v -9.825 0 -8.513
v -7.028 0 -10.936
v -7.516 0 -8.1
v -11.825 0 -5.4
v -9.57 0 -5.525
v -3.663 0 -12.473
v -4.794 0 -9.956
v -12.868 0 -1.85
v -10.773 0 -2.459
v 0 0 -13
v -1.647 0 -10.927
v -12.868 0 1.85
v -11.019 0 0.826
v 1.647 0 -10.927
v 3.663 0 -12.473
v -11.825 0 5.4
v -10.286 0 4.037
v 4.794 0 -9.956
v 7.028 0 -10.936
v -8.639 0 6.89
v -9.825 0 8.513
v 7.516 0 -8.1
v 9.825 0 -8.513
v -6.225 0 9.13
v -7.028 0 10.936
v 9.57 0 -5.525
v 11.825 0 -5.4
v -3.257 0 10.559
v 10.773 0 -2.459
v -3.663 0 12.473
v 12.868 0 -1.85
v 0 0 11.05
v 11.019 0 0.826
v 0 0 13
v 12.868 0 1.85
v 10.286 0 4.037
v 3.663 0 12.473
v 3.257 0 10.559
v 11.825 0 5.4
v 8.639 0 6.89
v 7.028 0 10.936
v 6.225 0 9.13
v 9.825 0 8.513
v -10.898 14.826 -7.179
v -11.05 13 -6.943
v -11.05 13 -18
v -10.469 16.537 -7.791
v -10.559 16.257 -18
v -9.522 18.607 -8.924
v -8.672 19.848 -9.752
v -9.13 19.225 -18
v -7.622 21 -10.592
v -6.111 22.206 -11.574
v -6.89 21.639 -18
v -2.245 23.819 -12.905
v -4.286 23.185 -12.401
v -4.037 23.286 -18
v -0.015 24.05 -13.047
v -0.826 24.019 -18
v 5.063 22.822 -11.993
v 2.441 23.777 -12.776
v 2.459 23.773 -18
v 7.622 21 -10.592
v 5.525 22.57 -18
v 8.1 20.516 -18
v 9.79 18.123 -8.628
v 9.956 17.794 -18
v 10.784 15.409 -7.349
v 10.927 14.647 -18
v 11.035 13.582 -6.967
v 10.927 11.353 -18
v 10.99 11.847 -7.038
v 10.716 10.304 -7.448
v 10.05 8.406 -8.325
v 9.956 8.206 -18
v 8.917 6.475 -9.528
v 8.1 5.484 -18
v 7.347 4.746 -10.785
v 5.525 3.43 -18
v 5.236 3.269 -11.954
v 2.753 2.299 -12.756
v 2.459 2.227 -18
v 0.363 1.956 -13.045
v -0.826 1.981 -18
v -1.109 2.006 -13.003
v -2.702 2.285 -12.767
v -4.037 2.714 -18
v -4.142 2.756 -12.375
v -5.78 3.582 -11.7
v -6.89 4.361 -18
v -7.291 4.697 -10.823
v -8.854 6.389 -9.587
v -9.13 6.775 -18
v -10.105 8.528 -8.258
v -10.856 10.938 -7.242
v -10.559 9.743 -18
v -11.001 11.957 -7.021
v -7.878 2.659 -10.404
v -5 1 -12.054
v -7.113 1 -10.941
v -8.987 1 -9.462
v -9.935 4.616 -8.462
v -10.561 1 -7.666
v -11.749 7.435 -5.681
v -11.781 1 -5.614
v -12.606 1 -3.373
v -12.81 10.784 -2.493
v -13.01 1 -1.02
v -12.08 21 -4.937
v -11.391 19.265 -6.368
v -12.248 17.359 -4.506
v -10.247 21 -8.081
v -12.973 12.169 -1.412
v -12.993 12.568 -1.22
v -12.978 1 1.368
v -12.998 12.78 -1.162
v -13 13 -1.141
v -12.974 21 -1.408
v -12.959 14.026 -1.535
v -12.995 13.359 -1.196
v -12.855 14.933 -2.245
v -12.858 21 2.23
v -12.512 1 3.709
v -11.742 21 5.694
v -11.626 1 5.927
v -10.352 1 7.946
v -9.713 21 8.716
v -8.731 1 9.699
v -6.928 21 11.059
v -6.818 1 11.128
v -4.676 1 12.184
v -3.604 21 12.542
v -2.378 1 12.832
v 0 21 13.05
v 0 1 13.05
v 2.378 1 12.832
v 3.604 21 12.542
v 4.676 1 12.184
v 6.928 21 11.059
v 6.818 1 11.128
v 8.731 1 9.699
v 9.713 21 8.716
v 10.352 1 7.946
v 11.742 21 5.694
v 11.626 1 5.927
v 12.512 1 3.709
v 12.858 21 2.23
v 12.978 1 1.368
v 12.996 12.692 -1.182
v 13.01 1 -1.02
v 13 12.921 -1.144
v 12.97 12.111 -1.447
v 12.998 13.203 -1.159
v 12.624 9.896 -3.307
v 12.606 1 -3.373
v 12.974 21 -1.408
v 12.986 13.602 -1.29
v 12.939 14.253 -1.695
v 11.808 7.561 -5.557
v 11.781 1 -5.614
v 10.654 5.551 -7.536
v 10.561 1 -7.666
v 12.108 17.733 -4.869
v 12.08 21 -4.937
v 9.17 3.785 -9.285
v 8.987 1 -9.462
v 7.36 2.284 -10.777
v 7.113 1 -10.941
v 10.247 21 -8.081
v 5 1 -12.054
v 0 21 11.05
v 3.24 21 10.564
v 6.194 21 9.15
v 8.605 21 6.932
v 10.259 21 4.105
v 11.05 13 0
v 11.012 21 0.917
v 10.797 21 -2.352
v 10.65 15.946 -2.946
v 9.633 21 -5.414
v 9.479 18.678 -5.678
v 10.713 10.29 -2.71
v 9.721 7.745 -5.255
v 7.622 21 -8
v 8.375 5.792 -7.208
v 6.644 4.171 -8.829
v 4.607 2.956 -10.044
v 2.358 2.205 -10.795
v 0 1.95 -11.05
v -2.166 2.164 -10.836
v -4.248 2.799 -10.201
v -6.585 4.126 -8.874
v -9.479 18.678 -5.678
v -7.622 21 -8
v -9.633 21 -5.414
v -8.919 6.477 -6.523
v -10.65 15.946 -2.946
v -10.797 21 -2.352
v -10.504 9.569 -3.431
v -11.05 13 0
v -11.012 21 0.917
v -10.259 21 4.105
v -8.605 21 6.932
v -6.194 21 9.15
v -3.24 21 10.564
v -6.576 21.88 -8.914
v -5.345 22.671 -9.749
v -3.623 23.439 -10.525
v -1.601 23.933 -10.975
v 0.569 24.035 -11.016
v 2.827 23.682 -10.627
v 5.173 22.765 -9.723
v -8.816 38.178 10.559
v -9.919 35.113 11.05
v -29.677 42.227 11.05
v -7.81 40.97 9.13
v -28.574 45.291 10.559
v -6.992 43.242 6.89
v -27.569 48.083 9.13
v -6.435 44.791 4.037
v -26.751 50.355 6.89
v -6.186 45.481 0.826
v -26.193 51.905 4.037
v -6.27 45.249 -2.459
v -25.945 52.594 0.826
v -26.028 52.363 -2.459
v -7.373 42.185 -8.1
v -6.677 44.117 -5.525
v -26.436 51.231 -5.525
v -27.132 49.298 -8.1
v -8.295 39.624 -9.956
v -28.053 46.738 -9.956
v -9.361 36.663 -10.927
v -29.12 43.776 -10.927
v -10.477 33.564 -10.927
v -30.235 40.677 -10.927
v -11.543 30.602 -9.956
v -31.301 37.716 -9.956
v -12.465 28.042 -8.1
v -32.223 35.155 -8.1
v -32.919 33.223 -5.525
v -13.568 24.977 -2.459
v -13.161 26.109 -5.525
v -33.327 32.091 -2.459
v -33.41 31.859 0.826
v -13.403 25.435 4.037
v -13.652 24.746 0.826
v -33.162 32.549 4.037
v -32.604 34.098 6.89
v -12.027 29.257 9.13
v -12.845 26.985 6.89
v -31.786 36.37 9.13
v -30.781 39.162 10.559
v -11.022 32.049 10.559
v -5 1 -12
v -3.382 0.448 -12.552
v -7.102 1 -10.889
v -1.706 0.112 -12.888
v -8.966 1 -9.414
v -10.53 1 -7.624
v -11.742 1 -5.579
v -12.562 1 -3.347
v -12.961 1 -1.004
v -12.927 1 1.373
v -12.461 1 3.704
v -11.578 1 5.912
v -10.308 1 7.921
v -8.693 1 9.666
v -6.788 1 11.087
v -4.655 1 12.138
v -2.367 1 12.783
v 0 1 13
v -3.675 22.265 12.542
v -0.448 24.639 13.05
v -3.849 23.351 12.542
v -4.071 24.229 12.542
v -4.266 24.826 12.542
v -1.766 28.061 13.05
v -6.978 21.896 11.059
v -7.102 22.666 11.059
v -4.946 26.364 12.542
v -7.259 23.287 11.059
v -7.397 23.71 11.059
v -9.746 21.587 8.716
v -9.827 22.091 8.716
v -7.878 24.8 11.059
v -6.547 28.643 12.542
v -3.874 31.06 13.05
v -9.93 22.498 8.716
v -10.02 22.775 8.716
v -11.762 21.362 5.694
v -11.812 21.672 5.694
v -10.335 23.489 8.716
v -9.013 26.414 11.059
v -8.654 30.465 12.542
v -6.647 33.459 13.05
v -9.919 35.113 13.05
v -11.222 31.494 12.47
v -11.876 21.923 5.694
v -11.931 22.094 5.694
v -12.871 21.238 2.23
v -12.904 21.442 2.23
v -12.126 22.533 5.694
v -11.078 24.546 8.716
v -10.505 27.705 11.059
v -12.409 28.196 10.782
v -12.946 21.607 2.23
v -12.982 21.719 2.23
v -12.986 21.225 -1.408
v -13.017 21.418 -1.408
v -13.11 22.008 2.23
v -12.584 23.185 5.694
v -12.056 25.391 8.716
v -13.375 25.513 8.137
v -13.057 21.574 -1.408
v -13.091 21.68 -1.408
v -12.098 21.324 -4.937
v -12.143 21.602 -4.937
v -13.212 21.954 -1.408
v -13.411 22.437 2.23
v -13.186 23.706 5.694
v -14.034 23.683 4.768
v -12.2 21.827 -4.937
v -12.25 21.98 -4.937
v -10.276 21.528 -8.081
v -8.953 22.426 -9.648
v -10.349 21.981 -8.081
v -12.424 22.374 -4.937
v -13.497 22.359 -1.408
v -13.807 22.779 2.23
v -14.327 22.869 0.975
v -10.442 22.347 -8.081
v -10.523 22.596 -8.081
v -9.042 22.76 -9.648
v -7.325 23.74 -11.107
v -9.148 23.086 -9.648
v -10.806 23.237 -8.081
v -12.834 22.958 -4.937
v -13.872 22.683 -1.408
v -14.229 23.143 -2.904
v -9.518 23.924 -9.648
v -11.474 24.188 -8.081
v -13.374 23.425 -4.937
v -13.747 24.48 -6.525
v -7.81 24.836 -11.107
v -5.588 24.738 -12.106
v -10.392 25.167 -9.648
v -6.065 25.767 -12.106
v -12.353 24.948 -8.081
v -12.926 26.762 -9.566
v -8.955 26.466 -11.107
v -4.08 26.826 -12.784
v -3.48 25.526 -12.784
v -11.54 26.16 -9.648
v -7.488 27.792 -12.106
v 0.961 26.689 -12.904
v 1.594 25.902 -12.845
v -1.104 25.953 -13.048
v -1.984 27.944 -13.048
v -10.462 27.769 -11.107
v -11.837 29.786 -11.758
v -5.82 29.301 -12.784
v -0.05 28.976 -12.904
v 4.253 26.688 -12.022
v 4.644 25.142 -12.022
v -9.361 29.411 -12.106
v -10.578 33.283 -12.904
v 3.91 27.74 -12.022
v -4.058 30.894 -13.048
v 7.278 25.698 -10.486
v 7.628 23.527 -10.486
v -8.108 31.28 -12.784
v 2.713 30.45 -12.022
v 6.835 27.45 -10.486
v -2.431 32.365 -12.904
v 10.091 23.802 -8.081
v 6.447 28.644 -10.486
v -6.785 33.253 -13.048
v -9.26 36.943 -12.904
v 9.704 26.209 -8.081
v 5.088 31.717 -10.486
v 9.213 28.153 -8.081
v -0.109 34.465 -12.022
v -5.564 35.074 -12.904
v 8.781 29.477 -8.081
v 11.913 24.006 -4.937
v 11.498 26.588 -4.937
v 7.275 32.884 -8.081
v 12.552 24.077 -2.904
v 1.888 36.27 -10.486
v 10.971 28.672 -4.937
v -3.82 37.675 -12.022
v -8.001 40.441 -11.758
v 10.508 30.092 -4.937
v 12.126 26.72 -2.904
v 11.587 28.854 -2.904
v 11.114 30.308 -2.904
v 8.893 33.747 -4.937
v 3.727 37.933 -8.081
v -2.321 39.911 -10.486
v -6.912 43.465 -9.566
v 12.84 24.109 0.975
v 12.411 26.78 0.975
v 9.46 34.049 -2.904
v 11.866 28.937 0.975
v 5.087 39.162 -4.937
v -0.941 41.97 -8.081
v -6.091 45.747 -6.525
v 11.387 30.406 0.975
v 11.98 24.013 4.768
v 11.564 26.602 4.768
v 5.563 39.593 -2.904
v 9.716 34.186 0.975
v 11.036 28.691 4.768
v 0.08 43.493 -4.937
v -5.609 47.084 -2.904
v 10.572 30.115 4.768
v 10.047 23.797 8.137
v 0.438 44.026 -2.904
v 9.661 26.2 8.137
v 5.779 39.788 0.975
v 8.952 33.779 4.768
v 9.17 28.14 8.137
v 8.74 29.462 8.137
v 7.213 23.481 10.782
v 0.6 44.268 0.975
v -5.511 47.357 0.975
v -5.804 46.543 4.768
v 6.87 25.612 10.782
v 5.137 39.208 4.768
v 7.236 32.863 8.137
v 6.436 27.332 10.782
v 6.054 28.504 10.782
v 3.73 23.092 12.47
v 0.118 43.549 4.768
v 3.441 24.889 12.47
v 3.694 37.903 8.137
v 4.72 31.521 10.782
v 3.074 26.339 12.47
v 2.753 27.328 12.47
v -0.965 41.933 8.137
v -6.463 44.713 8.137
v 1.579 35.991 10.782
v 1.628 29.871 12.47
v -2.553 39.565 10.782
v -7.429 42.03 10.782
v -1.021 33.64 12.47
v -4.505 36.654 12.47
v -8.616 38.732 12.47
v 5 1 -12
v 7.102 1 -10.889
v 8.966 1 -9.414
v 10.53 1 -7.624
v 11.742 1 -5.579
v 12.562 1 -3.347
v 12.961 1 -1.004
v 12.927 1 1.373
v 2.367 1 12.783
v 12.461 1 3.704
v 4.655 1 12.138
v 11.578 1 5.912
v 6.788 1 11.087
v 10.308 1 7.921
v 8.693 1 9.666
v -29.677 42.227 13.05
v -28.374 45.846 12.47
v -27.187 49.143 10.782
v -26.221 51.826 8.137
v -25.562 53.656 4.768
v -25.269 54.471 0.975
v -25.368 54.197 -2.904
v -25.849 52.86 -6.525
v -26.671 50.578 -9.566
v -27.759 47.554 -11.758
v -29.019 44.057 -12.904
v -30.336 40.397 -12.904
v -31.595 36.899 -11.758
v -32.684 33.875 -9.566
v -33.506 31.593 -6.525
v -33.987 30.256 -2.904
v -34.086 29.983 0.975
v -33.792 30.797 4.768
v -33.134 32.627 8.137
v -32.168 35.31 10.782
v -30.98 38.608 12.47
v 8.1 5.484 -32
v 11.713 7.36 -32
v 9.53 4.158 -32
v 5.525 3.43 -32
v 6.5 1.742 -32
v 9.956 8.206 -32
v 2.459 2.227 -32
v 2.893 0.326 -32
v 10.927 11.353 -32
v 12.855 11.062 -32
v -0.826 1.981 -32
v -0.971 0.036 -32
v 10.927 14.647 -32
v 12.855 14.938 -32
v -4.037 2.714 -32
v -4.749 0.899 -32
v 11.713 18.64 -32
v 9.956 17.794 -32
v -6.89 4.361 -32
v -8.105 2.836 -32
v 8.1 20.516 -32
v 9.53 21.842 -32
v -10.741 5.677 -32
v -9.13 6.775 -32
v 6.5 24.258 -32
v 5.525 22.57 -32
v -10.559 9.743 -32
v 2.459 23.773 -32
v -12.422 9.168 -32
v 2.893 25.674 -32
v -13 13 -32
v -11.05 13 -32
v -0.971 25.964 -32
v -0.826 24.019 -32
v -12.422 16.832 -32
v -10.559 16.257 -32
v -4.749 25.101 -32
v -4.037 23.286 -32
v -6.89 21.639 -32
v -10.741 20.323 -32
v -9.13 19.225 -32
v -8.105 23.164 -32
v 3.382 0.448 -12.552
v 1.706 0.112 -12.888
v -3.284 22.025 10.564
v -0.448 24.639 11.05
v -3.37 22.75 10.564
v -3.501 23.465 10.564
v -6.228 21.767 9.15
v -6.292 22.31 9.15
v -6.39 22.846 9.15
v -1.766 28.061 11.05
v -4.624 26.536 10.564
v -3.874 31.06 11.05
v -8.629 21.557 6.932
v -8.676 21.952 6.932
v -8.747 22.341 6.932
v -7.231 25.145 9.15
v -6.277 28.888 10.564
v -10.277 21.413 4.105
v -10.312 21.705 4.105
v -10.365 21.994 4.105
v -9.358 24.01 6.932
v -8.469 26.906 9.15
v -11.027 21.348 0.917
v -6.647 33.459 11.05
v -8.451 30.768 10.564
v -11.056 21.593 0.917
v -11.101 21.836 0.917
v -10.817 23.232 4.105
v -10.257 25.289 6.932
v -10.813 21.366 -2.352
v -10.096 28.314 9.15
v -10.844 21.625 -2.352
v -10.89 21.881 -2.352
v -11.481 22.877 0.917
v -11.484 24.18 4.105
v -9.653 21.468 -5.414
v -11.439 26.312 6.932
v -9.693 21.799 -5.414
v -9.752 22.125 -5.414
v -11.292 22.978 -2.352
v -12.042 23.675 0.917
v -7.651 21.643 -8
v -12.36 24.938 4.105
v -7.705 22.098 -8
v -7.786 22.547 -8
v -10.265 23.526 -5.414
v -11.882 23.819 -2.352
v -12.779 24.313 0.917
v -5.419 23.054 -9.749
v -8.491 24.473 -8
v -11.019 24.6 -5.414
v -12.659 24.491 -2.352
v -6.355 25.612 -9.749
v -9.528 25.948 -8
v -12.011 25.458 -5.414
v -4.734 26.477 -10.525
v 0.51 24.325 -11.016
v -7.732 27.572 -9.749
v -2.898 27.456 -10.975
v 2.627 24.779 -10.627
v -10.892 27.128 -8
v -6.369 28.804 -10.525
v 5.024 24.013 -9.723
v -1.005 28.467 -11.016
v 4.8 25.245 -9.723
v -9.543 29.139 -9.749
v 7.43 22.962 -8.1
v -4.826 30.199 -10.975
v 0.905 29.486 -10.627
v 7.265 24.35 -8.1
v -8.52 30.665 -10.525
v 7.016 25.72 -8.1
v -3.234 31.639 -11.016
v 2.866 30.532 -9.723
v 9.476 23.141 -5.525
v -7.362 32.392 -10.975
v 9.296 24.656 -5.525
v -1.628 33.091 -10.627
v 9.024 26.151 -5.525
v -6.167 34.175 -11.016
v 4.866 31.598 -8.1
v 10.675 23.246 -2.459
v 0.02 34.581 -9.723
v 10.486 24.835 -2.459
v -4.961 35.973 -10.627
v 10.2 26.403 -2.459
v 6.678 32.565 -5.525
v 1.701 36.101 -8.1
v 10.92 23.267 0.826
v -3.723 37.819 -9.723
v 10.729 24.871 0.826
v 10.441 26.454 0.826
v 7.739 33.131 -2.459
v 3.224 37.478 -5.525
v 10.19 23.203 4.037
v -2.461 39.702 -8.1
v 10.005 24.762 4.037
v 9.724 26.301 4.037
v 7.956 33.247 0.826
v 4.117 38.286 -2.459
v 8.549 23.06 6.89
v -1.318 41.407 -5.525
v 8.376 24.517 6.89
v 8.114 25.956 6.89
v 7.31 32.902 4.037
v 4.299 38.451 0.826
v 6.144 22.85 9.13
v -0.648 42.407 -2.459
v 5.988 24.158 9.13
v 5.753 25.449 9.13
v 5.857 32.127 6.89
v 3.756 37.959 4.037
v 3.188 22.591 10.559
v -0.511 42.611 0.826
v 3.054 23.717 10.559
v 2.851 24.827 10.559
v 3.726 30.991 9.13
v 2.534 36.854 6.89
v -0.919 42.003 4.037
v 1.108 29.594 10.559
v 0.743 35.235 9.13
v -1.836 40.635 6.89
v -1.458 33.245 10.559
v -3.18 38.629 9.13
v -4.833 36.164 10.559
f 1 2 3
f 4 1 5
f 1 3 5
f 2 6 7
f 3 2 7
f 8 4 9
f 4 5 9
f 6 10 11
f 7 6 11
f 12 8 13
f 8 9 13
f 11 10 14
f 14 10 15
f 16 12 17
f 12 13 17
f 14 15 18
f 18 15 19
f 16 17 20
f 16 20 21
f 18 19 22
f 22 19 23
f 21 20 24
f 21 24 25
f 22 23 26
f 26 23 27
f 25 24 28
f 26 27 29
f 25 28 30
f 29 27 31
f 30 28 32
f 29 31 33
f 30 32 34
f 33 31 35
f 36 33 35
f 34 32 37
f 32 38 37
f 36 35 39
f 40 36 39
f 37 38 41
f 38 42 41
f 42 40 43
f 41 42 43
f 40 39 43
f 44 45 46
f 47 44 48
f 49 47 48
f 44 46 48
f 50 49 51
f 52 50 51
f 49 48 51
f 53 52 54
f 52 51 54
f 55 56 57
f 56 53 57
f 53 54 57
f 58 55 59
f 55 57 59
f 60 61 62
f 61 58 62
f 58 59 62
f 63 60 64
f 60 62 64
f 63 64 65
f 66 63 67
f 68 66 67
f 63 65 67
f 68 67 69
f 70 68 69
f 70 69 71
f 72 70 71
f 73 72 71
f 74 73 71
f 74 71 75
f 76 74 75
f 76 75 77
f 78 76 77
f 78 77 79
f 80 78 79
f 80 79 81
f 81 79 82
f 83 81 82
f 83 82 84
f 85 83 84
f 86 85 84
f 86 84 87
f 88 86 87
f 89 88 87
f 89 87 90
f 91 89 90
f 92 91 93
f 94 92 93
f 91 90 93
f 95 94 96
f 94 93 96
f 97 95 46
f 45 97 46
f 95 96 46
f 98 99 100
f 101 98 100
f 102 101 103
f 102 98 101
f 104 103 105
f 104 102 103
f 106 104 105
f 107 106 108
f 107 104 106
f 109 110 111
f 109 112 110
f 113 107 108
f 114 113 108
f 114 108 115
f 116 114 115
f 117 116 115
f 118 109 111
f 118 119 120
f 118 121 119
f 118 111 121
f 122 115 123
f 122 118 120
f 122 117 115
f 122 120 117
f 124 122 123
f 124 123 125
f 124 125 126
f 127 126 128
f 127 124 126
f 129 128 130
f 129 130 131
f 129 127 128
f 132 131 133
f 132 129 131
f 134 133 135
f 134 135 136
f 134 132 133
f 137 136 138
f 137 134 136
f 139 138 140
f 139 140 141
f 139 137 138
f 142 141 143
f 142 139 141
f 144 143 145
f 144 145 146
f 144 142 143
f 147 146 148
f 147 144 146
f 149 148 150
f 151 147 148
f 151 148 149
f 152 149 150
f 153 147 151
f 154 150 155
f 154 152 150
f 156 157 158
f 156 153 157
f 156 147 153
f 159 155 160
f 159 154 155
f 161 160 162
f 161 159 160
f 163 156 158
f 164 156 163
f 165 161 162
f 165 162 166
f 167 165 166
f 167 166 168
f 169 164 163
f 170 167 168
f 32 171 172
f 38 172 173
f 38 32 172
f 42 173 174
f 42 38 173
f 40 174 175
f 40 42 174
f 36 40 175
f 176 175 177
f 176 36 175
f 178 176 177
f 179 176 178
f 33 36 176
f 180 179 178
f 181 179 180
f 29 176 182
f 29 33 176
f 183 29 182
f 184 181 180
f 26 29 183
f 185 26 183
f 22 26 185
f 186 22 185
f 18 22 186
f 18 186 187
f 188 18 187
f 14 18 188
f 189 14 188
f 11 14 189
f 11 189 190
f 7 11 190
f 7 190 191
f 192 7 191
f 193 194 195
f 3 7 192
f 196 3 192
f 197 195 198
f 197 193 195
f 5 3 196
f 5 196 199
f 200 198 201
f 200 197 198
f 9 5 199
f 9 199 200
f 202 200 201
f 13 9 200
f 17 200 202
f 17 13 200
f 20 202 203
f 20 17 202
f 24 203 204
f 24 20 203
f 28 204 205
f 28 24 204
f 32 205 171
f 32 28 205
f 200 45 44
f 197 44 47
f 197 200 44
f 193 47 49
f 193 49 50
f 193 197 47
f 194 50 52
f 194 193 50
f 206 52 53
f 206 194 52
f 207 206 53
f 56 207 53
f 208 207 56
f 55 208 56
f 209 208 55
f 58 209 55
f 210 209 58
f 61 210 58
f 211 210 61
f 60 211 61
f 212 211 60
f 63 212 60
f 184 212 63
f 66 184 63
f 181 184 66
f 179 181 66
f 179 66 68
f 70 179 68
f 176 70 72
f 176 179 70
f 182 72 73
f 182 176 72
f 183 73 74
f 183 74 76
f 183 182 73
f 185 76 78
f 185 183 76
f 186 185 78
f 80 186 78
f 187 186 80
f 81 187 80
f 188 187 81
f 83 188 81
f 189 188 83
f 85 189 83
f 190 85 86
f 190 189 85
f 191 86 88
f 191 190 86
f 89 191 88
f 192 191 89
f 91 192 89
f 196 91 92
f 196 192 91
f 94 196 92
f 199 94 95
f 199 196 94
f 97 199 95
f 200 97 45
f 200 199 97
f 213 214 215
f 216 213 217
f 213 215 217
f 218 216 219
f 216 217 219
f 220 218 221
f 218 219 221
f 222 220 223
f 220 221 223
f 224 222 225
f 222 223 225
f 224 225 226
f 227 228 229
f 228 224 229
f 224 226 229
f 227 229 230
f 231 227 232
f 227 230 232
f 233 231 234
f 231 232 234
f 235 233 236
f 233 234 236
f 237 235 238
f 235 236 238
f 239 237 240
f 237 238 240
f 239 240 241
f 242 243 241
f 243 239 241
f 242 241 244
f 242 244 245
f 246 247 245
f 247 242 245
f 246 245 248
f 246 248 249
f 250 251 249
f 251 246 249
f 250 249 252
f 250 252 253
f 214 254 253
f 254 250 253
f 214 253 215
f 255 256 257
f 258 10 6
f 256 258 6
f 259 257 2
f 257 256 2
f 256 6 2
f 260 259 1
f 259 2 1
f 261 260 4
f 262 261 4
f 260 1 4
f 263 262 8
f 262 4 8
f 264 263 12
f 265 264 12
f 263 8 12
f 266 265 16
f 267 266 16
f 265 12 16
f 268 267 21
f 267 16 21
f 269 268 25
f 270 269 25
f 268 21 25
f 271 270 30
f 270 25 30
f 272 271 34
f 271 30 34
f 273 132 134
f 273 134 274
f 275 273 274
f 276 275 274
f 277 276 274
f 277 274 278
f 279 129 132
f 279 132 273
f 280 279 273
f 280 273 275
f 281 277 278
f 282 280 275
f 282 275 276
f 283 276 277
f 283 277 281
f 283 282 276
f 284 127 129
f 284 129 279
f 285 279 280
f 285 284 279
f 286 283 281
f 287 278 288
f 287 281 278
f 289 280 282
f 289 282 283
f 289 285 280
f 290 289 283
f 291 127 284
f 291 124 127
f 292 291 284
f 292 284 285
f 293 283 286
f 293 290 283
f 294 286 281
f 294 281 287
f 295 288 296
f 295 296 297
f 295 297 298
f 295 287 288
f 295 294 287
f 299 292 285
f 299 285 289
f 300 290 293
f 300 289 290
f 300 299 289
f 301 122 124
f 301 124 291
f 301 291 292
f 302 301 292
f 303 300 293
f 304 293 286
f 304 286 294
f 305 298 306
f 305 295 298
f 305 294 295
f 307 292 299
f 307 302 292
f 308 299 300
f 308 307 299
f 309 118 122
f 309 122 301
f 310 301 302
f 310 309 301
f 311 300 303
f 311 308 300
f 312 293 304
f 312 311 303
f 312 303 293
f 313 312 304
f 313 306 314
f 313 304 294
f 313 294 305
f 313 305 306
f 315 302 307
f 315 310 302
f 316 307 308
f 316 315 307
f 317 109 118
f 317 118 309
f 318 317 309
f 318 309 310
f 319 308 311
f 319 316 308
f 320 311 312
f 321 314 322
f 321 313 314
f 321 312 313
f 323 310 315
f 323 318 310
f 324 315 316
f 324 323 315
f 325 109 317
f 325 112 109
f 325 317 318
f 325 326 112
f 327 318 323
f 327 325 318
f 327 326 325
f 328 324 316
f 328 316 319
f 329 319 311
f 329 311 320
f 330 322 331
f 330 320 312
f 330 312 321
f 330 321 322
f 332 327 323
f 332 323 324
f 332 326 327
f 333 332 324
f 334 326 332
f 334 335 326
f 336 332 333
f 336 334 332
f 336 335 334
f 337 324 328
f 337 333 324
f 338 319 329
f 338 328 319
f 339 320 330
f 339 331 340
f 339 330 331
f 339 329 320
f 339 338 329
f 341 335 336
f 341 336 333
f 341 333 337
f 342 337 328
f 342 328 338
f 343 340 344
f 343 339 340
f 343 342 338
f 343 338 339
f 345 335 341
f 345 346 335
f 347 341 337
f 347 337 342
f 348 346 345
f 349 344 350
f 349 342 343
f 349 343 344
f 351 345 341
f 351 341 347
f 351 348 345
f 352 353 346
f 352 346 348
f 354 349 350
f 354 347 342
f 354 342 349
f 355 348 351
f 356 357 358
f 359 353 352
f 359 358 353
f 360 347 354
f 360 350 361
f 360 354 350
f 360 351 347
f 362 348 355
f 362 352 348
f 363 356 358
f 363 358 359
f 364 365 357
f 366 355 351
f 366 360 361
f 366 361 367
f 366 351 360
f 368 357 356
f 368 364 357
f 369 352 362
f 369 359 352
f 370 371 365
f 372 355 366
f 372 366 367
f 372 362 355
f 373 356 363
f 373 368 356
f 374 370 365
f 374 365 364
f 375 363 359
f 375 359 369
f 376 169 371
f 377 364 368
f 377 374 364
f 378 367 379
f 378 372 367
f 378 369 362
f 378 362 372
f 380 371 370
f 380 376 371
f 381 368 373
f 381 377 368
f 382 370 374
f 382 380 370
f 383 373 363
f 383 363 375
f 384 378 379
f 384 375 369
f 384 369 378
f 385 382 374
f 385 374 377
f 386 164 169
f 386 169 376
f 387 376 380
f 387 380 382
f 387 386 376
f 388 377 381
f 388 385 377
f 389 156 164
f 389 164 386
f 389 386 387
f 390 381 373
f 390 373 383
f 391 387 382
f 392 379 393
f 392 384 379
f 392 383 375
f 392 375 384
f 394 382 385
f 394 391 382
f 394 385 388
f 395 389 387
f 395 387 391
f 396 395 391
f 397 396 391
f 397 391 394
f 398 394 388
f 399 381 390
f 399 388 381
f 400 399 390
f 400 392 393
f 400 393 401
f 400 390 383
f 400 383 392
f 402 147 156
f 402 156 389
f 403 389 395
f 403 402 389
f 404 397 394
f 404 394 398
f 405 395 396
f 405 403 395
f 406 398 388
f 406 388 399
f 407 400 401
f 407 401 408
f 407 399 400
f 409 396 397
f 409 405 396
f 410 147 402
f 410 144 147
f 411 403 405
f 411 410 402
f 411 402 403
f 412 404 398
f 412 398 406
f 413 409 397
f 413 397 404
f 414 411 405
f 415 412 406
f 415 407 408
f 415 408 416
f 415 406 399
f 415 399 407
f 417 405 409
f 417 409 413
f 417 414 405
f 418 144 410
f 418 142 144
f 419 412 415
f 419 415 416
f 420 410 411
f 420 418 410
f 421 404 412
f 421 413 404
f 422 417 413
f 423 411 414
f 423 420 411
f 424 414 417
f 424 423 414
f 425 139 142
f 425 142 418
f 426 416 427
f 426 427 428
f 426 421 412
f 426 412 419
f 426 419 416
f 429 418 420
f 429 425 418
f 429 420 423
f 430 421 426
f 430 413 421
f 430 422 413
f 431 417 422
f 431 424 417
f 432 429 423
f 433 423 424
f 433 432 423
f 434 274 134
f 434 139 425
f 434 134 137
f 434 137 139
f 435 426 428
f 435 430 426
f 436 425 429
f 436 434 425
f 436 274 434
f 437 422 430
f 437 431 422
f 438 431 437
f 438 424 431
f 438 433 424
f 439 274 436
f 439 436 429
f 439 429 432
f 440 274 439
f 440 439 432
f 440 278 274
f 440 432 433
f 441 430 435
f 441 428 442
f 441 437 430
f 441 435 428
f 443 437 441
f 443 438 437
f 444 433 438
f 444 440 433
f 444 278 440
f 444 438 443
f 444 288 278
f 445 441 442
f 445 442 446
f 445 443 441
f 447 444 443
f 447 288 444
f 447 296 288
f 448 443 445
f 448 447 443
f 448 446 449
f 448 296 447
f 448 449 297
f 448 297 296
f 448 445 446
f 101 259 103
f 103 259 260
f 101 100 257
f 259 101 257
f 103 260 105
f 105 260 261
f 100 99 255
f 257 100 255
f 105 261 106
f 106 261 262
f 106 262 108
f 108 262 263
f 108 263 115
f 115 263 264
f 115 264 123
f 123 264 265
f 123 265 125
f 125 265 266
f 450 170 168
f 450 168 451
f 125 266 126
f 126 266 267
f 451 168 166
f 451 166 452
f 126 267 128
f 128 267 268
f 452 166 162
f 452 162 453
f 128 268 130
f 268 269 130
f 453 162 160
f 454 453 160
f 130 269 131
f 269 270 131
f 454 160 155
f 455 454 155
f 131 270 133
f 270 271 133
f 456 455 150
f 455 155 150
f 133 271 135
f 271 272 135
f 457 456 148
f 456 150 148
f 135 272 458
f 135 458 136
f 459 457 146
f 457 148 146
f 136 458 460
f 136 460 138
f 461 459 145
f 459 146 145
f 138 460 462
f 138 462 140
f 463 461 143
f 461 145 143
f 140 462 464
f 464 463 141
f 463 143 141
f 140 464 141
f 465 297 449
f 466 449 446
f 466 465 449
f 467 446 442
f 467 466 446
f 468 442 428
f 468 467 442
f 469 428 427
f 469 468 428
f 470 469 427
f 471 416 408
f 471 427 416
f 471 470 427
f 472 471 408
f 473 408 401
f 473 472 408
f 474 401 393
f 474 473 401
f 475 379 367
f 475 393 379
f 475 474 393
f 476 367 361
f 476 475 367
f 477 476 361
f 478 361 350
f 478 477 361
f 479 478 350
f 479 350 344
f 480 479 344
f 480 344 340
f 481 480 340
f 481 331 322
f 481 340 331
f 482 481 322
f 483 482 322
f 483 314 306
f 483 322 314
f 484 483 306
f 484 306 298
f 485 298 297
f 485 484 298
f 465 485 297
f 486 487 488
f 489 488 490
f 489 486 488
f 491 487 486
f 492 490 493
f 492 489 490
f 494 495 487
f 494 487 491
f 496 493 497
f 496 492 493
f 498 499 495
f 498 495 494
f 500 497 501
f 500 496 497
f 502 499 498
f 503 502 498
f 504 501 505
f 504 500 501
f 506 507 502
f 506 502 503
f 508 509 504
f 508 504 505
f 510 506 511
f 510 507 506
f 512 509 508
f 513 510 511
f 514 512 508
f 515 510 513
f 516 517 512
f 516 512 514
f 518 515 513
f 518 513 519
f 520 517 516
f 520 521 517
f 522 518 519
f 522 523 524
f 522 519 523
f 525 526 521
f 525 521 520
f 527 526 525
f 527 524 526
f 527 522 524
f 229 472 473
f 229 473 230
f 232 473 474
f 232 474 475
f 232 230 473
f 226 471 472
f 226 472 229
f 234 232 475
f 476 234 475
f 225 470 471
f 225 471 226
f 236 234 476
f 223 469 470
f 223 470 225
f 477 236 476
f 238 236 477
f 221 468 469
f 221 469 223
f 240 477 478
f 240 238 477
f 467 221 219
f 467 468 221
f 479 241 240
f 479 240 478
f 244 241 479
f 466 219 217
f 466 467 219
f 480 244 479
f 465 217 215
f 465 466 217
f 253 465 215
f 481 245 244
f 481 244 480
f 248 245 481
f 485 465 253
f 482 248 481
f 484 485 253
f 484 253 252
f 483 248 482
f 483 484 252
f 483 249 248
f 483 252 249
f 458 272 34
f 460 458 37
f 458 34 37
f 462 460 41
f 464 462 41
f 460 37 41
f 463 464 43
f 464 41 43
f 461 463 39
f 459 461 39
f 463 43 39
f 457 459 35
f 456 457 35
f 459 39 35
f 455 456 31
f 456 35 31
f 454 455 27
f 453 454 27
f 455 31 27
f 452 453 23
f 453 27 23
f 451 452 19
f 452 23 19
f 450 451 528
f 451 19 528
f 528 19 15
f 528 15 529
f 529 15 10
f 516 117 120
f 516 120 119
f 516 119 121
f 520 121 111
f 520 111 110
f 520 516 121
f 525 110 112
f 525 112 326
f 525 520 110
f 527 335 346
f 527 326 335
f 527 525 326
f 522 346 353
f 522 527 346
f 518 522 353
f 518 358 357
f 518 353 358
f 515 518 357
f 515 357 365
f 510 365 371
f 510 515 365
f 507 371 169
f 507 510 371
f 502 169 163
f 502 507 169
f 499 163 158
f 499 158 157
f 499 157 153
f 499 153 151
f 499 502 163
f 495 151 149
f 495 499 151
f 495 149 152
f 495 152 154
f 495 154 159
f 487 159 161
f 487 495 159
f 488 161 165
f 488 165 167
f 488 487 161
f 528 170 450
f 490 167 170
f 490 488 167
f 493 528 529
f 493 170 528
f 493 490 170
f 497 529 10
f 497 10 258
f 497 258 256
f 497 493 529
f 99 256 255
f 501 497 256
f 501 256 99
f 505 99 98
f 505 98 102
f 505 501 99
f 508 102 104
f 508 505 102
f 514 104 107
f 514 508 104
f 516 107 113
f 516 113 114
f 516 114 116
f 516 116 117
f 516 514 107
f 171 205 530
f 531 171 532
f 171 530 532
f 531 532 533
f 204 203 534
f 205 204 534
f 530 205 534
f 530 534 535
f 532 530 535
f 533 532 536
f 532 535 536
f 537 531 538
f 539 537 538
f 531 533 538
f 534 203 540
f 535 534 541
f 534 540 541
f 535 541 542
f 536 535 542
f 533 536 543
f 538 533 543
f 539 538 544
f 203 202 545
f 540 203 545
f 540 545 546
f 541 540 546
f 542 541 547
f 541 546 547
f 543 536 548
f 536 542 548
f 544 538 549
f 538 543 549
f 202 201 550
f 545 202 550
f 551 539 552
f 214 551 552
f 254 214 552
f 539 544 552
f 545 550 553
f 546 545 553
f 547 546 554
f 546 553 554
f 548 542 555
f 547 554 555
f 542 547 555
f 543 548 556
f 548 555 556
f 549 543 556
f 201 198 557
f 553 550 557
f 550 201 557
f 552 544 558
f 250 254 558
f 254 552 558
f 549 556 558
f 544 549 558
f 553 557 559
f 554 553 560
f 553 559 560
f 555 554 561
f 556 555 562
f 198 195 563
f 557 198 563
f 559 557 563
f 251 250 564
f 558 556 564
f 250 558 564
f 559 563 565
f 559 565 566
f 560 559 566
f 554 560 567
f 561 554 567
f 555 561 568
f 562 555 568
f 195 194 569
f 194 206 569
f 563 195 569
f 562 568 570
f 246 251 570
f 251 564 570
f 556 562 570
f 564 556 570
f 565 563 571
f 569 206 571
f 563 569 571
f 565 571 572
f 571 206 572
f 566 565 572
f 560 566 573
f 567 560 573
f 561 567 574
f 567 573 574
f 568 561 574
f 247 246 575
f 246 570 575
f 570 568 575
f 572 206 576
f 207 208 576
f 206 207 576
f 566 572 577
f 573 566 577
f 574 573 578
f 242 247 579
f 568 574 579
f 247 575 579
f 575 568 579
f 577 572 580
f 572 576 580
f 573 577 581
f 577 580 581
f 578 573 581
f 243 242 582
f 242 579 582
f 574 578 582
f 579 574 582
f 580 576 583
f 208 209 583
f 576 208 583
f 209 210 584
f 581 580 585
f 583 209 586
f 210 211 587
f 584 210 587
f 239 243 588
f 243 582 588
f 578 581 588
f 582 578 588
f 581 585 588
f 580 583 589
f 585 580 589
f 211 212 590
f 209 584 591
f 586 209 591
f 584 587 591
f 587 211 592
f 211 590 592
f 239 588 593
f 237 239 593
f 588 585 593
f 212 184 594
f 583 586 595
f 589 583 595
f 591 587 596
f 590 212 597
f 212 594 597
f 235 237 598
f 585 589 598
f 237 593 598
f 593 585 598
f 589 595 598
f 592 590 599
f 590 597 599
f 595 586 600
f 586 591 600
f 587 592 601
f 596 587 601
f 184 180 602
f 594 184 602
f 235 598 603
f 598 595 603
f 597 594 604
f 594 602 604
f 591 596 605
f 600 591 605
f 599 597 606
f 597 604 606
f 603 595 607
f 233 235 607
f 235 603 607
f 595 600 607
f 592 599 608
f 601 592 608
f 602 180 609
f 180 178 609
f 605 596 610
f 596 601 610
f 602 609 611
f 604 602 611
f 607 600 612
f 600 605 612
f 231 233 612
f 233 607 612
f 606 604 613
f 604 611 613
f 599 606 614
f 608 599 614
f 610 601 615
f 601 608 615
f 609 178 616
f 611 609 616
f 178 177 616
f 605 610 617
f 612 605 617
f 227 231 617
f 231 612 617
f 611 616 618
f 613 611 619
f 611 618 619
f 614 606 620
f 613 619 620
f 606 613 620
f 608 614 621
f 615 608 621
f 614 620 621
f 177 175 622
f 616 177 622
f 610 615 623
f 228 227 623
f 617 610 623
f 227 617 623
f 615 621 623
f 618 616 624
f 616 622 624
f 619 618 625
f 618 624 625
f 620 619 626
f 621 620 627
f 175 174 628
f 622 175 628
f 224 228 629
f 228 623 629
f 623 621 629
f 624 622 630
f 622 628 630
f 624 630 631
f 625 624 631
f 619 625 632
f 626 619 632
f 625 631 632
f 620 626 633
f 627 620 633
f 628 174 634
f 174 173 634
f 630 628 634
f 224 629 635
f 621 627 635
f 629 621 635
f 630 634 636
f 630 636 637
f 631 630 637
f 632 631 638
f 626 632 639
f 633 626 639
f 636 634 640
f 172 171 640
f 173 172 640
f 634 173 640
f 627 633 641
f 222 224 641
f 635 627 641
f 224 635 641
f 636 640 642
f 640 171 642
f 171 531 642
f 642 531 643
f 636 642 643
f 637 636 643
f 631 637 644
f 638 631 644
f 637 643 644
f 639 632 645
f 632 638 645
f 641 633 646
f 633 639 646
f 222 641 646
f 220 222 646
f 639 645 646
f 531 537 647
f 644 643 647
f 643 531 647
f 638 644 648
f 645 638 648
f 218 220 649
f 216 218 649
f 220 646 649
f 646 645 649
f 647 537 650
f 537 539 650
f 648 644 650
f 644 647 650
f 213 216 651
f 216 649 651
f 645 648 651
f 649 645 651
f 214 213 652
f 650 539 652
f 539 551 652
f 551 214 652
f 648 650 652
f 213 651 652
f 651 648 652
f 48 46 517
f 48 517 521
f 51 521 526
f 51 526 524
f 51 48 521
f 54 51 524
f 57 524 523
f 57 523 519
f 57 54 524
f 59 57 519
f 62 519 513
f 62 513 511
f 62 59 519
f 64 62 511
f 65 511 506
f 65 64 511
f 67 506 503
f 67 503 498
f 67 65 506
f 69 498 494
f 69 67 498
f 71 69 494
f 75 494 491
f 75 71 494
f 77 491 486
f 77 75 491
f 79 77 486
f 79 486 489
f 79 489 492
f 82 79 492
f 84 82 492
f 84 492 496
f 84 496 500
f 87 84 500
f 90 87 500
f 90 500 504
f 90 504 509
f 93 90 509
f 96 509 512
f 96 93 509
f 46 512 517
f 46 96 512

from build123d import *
from build123d.topology import SkipClean

# Parameters (mm, degrees)
CROQUIS1_R                          = 13
CROQUIS1_R_2                        = 11.05
SALIENTE_EXTRUIR1_DEPTH             = 1
BARRER_L_MINA1_PROFILE_R            = 13.05
BARRER_L_MINA1_PROFILE_R_2          = 11.05
CROQUIS19_R                         = 13
CROQUIS19_R_2                       = 11.05
SALIENTE_EXTRUIR2_DEPTH             = 14
SALIENTE_EXTRUIR2_DIRECTION_2_REACH = 73.397
CORTAR_EXTRUIR1_START               = -32.0000001
CORTAR_EXTRUIR1_OUTLINE_R           = 11.05
CORTAR_EXTRUIR1_DEPTH               = 32.0000001


with BuildPart() as part:
    # Croquis1 → Saliente-Extruir1 (new body)
    with BuildSketch(Plane(origin=(0, 0, 0), x_dir=(1, 0, 0), z_dir=(0, 1, 0))):
        with Locations(Location((0, 0, 0), (0, 0, 270))):
            Circle(CROQUIS1_R)
        with Locations(Location((0, 0, 0), (0, 0, 270))):
            Circle(CROQUIS1_R_2, mode=Mode.SUBTRACT)
    extrude(amount=SALIENTE_EXTRUIR1_DEPTH)

    # Barrer-Lámina1: sweep along a path in Croquis2
    with BuildLine(Plane.XY) as barrer_l_mina1_path:
        Line((0, 1), (0, 21))
        ThreePointArc((0, 21), (-2.727754239, 29.625078781), (-9.918931196, 35.113211534))
        Line((-9.918931196, 35.113211534), (-29.677427344, 42.226707859))
    # Barrer-Lámina1 profile (on start of the path) → Barrer-Lámina1 (sweep)
    with BuildSketch(Plane.ZX.offset(1)):
        Circle(BARRER_L_MINA1_PROFILE_R)
        Circle(BARRER_L_MINA1_PROFILE_R_2, mode=Mode.SUBTRACT)
    sweep(path=barrer_l_mina1_path.line)

    # Croquis19 → Saliente-Extruir2 (add)
    with BuildSketch(Plane(origin=(0, 0, -18), x_dir=(-1, 0, 0), z_dir=(0, 0, -1))):
        with Locations((0, 13)):
            Circle(CROQUIS19_R)
        with Locations((0, 13)):
            Circle(CROQUIS19_R_2, mode=Mode.SUBTRACT)
    extrude(amount=SALIENTE_EXTRUIR2_DEPTH)

    # Croquis19 → Saliente-Extruir2 direction 2 (add, up to next)
    with BuildSketch(Plane(origin=(0, 0, -18), x_dir=(-1, 0, 0), z_dir=(0, 0, -1)), mode=Mode.PRIVATE) as saliente_extruir2_direction_2_sk1:
        with Locations((0, 13)):
            Circle(CROQUIS19_R)
        with Locations((0, 13)):
            Circle(CROQUIS19_R_2, mode=Mode.SUBTRACT)
    saliente_extruir2_direction_2_tool1 = extrude(saliente_extruir2_direction_2_sk1.sketch, amount=-SALIENTE_EXTRUIR2_DIRECTION_2_REACH, mode=Mode.PRIVATE) - part.part
    add(saliente_extruir2_direction_2_tool1.solids().sort_by_distance((12.632304, 13, -18))[0])

    # Cortar-Extruir1: read off the stored shape, not the designer's step
    # Cortar-Extruir1 outline → Cortar-Extruir1 (cut)
    with SkipClean():  # the faces are left unmerged after this step: merging them gives an invalid solid
        with BuildSketch(Plane(origin=(0, 0, -32), x_dir=(-1, 0, 0), z_dir=(0, 0, -1)).offset(CORTAR_EXTRUIR1_START)):
            with Locations((0, 13)):
                Circle(CORTAR_EXTRUIR1_OUTLINE_R)
        extrude(amount=CORTAR_EXTRUIR1_DEPTH, mode=Mode.SUBTRACT)


solid = part.part
